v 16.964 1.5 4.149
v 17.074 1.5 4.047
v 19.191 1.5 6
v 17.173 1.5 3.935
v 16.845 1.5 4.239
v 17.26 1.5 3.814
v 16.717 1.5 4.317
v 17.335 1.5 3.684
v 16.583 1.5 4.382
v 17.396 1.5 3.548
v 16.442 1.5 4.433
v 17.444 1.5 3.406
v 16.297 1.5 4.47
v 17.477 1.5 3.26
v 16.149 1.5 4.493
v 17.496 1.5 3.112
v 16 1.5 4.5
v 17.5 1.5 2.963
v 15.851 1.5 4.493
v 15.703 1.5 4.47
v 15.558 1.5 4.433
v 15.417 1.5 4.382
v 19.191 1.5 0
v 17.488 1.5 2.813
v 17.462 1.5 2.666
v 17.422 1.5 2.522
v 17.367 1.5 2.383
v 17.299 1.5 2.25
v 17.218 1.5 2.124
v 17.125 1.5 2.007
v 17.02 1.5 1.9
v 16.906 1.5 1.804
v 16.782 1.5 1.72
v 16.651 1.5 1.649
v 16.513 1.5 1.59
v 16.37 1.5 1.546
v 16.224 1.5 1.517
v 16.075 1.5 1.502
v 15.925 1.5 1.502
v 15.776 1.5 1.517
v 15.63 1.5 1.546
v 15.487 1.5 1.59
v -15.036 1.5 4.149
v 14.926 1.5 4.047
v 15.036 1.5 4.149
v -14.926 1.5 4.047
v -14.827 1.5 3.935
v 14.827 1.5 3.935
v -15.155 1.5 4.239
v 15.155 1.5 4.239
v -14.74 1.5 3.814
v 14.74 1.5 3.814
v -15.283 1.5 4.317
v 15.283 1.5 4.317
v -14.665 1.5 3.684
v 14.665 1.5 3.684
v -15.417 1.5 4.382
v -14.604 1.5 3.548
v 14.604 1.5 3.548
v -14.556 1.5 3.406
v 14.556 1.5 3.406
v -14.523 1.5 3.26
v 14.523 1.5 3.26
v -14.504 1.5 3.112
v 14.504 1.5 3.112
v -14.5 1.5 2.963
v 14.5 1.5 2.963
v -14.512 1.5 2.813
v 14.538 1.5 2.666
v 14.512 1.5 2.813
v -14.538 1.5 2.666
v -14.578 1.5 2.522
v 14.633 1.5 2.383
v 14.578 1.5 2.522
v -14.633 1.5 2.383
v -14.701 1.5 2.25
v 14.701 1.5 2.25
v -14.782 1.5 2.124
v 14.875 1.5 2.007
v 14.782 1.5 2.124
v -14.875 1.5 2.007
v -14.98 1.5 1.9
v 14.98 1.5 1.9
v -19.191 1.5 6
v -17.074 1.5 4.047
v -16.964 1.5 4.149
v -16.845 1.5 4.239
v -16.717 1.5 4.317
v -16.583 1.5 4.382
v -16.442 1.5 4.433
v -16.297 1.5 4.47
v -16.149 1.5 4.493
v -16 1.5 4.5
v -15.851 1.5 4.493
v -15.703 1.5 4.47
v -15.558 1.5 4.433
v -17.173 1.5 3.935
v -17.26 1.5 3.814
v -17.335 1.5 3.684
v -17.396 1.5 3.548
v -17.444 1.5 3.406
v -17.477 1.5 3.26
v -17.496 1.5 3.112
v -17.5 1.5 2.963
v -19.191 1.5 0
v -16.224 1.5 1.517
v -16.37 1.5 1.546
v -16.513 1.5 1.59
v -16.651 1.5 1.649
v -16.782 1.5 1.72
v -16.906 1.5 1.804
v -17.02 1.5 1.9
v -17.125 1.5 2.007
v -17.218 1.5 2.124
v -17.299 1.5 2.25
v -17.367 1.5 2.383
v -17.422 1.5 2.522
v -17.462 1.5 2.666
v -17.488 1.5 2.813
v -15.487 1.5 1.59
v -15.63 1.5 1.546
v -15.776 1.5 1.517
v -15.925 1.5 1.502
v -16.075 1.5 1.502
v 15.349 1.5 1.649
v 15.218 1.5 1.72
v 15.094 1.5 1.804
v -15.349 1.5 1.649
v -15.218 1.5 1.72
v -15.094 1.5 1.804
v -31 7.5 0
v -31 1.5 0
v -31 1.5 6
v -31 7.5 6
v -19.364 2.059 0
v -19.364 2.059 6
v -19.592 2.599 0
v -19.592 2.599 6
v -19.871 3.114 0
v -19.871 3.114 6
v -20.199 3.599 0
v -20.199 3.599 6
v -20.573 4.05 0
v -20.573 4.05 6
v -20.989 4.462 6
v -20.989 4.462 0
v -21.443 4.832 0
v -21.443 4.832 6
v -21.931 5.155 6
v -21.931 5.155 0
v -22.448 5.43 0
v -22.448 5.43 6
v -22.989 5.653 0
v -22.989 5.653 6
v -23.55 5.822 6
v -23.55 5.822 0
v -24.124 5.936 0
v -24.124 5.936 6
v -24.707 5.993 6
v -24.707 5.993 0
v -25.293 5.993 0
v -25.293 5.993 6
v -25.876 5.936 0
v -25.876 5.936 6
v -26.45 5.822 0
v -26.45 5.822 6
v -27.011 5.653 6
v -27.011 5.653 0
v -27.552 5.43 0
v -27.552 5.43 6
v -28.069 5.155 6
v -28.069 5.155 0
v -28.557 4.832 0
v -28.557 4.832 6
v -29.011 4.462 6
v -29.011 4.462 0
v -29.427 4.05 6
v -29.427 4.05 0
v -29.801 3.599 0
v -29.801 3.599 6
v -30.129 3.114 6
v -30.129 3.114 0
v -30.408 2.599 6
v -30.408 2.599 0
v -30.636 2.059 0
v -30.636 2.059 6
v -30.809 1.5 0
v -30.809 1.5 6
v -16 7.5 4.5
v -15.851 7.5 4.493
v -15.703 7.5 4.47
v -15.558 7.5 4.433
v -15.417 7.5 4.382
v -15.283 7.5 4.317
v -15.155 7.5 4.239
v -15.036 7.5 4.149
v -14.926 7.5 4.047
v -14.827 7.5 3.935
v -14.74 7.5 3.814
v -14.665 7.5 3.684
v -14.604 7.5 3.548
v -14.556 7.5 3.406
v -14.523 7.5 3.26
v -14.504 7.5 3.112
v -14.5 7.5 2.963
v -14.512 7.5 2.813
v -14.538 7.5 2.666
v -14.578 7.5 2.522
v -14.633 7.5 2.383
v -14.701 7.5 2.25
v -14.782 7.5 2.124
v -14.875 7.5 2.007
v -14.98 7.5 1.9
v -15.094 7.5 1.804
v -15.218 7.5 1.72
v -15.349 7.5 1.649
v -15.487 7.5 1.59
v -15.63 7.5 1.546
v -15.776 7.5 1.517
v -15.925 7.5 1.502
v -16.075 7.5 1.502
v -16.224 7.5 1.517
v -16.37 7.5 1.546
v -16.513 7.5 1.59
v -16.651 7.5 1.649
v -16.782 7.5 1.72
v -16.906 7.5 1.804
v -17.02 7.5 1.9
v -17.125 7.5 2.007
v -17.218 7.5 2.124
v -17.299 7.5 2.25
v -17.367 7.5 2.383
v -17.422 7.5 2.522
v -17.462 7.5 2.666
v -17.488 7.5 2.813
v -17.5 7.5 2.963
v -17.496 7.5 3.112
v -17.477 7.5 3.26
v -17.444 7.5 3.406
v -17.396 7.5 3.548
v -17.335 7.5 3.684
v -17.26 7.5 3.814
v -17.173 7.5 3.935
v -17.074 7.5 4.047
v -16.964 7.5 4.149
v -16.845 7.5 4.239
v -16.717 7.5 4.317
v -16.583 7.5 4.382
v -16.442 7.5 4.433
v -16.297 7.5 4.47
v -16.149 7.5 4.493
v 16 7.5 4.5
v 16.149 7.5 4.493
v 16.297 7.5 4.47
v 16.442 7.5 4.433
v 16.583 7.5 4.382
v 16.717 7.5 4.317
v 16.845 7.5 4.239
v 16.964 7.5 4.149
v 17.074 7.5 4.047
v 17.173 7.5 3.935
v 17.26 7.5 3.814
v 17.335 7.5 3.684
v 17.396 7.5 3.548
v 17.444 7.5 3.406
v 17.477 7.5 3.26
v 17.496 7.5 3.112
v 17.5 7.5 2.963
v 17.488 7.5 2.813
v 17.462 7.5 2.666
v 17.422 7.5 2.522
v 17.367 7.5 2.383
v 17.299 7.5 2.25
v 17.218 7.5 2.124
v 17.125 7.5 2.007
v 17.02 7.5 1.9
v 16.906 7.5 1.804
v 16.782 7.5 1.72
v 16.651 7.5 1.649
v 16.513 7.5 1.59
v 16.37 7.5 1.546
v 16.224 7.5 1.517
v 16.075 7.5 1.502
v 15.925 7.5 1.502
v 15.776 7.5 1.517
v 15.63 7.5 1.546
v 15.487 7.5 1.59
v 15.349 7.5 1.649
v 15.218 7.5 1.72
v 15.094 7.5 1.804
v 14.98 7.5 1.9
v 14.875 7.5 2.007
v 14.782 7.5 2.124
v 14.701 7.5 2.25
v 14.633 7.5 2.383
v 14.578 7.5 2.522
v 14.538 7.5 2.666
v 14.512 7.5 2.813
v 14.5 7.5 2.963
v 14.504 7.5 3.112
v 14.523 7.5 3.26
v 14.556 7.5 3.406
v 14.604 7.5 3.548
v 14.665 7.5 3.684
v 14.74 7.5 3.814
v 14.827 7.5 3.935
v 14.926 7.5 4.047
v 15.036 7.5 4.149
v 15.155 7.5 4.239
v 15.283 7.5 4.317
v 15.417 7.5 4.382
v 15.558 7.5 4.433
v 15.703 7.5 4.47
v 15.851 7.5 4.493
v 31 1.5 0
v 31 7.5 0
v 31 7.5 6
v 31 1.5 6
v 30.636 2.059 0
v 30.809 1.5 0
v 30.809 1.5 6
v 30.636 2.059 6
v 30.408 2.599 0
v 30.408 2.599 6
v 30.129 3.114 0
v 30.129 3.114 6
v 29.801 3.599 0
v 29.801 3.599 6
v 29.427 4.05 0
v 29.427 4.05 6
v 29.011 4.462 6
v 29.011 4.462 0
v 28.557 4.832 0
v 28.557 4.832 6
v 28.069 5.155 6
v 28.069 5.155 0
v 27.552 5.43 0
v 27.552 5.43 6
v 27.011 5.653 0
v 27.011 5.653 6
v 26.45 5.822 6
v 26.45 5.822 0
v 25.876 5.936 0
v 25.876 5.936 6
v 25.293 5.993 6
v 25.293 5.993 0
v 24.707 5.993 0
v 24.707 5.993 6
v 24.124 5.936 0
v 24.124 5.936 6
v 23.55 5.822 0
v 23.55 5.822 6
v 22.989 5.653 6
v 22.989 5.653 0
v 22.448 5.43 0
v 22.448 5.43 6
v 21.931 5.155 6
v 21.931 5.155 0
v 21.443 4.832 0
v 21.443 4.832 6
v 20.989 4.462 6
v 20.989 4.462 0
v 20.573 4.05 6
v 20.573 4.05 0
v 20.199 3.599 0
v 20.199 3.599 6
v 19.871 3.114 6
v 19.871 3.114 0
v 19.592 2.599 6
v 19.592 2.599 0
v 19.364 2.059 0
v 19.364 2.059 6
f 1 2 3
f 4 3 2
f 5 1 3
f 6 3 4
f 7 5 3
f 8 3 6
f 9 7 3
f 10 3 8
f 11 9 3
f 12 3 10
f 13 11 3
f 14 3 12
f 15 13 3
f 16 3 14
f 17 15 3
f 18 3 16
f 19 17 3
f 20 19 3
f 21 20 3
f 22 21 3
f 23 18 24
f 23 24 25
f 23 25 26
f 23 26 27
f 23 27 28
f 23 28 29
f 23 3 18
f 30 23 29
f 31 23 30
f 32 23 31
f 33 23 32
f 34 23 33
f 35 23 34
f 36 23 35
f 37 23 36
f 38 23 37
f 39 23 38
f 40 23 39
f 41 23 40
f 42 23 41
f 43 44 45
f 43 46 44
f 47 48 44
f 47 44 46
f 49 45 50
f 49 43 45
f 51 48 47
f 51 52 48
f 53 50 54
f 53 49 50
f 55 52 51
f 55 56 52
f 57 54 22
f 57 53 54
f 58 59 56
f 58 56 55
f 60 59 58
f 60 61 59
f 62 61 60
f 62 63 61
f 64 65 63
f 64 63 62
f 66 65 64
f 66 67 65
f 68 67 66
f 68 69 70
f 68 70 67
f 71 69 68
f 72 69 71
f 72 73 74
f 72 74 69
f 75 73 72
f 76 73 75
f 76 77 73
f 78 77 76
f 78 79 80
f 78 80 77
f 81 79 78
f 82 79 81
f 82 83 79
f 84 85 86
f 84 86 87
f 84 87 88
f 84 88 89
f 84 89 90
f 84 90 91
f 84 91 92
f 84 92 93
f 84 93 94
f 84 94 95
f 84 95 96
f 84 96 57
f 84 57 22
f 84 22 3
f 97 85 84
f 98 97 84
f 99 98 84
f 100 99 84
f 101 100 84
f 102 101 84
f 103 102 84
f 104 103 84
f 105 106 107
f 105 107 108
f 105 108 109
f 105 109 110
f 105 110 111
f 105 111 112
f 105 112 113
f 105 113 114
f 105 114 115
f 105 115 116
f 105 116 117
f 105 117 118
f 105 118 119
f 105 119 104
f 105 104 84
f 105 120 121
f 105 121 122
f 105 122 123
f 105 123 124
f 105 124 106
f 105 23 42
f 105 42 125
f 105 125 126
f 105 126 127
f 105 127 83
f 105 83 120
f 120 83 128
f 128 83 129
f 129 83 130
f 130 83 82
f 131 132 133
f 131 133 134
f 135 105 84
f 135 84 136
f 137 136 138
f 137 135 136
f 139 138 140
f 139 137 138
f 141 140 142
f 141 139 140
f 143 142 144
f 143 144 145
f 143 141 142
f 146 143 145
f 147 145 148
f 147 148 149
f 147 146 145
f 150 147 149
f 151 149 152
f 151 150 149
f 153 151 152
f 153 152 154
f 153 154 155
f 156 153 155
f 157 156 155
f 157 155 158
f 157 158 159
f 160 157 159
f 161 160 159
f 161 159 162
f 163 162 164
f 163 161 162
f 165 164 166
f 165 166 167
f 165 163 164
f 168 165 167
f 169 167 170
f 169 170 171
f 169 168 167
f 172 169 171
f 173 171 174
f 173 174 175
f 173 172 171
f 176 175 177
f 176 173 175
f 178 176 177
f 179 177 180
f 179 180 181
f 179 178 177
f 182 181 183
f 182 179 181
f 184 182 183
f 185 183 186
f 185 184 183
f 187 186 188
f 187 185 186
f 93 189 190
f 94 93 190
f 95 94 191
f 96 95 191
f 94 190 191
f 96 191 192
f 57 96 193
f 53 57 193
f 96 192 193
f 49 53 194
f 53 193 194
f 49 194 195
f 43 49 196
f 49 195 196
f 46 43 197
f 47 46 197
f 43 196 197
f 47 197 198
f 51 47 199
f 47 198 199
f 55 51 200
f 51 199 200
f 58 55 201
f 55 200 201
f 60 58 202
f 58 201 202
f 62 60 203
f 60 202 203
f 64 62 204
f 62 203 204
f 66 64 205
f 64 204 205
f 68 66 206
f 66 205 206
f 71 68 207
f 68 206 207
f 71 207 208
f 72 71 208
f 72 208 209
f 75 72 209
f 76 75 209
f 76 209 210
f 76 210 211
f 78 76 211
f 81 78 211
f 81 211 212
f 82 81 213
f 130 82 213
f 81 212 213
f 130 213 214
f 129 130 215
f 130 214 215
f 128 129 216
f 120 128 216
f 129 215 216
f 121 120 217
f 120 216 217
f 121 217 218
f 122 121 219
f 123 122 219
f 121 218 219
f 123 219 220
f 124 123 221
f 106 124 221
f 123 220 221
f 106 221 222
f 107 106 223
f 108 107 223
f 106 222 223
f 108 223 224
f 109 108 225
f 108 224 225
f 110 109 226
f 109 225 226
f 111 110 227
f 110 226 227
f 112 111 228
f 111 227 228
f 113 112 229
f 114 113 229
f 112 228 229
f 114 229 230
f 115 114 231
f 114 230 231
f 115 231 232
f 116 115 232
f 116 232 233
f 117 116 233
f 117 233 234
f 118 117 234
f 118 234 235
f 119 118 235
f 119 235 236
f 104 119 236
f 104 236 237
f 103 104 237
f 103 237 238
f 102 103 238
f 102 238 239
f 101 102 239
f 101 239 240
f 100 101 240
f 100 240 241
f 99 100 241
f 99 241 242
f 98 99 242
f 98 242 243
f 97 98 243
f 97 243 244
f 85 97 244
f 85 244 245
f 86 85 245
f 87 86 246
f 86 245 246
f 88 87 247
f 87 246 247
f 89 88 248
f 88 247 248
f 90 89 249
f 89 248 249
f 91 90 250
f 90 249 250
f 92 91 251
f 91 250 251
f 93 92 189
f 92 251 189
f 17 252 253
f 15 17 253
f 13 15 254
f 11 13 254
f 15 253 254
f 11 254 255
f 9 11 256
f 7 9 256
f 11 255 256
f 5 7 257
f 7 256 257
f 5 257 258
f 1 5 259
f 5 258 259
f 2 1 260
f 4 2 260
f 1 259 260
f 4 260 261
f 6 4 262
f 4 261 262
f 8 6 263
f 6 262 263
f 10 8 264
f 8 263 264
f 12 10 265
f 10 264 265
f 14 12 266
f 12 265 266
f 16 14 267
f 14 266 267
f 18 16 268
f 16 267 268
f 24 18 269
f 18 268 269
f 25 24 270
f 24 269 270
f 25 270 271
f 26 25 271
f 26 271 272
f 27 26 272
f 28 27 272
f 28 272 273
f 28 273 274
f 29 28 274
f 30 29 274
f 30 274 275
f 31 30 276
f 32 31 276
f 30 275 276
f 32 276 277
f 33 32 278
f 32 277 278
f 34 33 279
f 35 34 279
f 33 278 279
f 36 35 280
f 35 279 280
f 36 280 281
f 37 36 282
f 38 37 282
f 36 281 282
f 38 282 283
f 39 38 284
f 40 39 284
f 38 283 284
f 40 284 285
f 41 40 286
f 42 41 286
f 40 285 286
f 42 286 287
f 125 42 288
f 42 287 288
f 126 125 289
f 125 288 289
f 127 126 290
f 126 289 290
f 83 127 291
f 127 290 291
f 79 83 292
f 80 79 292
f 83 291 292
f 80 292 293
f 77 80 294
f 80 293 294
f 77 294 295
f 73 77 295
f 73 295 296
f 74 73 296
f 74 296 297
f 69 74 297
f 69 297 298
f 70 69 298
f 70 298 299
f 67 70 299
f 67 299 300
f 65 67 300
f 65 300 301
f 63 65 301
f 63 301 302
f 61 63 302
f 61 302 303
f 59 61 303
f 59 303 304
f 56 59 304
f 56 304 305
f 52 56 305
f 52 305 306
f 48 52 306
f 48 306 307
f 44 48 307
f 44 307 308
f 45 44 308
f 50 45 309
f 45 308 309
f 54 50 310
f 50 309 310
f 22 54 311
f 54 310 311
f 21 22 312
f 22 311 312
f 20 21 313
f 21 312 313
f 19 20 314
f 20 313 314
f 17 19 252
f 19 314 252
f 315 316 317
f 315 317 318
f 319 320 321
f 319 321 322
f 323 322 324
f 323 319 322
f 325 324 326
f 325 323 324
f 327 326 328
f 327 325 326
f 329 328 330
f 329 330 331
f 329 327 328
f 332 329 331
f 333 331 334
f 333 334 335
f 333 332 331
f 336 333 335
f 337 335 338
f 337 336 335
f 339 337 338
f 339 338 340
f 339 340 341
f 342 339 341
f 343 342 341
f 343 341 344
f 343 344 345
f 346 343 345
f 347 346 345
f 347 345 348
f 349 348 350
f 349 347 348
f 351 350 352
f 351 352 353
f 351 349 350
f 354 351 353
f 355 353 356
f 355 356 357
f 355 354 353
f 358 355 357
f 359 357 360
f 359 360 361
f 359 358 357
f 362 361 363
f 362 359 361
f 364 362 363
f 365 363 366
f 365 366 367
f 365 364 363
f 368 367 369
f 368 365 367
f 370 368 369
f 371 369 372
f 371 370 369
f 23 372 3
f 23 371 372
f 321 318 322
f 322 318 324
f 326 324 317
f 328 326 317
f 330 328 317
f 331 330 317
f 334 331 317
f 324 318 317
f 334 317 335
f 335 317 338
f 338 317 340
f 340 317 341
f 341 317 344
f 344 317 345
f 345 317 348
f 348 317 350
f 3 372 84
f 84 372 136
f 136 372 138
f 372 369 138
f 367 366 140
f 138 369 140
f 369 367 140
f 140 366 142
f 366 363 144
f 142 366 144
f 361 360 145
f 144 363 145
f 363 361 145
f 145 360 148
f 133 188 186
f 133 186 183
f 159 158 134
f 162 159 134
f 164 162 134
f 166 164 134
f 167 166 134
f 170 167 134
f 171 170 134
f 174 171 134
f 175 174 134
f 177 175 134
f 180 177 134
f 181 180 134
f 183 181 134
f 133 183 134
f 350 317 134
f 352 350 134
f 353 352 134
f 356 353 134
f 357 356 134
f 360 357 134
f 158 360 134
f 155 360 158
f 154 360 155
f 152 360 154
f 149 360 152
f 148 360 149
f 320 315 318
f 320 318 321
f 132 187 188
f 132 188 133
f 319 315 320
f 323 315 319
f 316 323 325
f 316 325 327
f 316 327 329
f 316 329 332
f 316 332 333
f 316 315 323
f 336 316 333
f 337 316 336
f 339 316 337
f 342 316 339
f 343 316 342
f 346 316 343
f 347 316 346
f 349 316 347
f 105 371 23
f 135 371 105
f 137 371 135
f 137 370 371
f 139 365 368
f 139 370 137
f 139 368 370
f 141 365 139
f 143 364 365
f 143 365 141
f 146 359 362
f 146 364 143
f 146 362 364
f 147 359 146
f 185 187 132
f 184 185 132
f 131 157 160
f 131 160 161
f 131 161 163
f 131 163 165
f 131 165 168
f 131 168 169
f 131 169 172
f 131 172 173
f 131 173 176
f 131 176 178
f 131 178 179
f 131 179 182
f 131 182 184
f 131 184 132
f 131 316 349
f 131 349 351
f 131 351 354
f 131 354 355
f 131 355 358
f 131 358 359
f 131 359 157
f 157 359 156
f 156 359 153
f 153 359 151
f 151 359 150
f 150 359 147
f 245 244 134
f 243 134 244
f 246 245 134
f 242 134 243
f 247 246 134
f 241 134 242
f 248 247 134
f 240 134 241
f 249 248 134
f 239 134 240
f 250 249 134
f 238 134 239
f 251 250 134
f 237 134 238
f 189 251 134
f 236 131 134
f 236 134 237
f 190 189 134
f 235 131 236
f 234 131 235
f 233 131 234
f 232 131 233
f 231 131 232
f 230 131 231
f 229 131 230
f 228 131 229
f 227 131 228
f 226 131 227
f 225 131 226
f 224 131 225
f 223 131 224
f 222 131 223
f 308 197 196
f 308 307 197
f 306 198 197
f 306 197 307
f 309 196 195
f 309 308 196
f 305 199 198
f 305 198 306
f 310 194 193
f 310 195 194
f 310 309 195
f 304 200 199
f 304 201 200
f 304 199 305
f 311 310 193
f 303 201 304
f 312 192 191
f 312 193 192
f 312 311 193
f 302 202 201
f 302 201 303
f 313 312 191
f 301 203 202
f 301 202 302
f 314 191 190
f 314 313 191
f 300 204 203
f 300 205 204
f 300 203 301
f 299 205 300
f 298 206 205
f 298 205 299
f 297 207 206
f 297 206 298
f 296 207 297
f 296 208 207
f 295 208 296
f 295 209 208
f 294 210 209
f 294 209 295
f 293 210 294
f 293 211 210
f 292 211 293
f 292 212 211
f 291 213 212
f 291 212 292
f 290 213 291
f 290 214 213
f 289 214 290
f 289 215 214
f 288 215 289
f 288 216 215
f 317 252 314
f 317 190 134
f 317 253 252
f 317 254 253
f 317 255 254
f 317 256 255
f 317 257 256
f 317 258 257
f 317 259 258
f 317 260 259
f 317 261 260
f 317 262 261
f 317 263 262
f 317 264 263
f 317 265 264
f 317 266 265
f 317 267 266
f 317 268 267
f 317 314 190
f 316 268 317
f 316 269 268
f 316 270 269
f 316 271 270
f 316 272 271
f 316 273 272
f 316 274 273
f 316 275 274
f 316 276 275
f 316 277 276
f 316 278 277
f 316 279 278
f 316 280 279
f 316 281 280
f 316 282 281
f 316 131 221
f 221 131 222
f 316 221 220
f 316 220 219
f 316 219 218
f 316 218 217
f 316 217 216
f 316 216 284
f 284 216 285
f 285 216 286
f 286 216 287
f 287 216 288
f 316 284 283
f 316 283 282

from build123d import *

# Parameters (mm, degrees)
BOSS_EXTRU_1_DEPTH      = 6
ESQUISSE2_R             = 1.5
ENL_V_MAT_EXTRU_1_DEPTH = 6


with BuildPart() as part:
    # Esquisse1 → Boss.-Extru.1 (new body)
    with BuildSketch(Plane.XY):
        with BuildLine():
            Line((-31, 1.5), (-31, 7.5))
            Line((-31, 7.5), (31, 7.5))
            Line((31, 7.5), (31, 1.5))
            Line((31, 1.5), (30.809475019, 1.5))
            ThreePointArc((30.809475019, 1.5), (25, 6), (19.190524981, 1.5))
            Line((19.190524981, 1.5), (-19.190524981, 1.5))
            ThreePointArc((-19.190524981, 1.5), (-25, 6), (-30.809475019, 1.5))
            Line((-30.809475019, 1.5), (-31, 1.5))
        make_face()
    extrude(amount=BOSS_EXTRU_1_DEPTH)

    # Esquisse2 → Enlèv. mat.-Extru.1 (cut)
    with BuildSketch(Plane(origin=(0, 7.5, 0), x_dir=(1, 0, 0), z_dir=(0, 1, 0))):
        with Locations(Location((-16, -3, 0), (0, 0, 270))):
            Circle(ESQUISSE2_R)
        with Locations(Location((16, -3, 0), (0, 0, 270))):
            Circle(ESQUISSE2_R)
    extrude(amount=-ENL_V_MAT_EXTRU_1_DEPTH, mode=Mode.SUBTRACT)


solid = part.part
